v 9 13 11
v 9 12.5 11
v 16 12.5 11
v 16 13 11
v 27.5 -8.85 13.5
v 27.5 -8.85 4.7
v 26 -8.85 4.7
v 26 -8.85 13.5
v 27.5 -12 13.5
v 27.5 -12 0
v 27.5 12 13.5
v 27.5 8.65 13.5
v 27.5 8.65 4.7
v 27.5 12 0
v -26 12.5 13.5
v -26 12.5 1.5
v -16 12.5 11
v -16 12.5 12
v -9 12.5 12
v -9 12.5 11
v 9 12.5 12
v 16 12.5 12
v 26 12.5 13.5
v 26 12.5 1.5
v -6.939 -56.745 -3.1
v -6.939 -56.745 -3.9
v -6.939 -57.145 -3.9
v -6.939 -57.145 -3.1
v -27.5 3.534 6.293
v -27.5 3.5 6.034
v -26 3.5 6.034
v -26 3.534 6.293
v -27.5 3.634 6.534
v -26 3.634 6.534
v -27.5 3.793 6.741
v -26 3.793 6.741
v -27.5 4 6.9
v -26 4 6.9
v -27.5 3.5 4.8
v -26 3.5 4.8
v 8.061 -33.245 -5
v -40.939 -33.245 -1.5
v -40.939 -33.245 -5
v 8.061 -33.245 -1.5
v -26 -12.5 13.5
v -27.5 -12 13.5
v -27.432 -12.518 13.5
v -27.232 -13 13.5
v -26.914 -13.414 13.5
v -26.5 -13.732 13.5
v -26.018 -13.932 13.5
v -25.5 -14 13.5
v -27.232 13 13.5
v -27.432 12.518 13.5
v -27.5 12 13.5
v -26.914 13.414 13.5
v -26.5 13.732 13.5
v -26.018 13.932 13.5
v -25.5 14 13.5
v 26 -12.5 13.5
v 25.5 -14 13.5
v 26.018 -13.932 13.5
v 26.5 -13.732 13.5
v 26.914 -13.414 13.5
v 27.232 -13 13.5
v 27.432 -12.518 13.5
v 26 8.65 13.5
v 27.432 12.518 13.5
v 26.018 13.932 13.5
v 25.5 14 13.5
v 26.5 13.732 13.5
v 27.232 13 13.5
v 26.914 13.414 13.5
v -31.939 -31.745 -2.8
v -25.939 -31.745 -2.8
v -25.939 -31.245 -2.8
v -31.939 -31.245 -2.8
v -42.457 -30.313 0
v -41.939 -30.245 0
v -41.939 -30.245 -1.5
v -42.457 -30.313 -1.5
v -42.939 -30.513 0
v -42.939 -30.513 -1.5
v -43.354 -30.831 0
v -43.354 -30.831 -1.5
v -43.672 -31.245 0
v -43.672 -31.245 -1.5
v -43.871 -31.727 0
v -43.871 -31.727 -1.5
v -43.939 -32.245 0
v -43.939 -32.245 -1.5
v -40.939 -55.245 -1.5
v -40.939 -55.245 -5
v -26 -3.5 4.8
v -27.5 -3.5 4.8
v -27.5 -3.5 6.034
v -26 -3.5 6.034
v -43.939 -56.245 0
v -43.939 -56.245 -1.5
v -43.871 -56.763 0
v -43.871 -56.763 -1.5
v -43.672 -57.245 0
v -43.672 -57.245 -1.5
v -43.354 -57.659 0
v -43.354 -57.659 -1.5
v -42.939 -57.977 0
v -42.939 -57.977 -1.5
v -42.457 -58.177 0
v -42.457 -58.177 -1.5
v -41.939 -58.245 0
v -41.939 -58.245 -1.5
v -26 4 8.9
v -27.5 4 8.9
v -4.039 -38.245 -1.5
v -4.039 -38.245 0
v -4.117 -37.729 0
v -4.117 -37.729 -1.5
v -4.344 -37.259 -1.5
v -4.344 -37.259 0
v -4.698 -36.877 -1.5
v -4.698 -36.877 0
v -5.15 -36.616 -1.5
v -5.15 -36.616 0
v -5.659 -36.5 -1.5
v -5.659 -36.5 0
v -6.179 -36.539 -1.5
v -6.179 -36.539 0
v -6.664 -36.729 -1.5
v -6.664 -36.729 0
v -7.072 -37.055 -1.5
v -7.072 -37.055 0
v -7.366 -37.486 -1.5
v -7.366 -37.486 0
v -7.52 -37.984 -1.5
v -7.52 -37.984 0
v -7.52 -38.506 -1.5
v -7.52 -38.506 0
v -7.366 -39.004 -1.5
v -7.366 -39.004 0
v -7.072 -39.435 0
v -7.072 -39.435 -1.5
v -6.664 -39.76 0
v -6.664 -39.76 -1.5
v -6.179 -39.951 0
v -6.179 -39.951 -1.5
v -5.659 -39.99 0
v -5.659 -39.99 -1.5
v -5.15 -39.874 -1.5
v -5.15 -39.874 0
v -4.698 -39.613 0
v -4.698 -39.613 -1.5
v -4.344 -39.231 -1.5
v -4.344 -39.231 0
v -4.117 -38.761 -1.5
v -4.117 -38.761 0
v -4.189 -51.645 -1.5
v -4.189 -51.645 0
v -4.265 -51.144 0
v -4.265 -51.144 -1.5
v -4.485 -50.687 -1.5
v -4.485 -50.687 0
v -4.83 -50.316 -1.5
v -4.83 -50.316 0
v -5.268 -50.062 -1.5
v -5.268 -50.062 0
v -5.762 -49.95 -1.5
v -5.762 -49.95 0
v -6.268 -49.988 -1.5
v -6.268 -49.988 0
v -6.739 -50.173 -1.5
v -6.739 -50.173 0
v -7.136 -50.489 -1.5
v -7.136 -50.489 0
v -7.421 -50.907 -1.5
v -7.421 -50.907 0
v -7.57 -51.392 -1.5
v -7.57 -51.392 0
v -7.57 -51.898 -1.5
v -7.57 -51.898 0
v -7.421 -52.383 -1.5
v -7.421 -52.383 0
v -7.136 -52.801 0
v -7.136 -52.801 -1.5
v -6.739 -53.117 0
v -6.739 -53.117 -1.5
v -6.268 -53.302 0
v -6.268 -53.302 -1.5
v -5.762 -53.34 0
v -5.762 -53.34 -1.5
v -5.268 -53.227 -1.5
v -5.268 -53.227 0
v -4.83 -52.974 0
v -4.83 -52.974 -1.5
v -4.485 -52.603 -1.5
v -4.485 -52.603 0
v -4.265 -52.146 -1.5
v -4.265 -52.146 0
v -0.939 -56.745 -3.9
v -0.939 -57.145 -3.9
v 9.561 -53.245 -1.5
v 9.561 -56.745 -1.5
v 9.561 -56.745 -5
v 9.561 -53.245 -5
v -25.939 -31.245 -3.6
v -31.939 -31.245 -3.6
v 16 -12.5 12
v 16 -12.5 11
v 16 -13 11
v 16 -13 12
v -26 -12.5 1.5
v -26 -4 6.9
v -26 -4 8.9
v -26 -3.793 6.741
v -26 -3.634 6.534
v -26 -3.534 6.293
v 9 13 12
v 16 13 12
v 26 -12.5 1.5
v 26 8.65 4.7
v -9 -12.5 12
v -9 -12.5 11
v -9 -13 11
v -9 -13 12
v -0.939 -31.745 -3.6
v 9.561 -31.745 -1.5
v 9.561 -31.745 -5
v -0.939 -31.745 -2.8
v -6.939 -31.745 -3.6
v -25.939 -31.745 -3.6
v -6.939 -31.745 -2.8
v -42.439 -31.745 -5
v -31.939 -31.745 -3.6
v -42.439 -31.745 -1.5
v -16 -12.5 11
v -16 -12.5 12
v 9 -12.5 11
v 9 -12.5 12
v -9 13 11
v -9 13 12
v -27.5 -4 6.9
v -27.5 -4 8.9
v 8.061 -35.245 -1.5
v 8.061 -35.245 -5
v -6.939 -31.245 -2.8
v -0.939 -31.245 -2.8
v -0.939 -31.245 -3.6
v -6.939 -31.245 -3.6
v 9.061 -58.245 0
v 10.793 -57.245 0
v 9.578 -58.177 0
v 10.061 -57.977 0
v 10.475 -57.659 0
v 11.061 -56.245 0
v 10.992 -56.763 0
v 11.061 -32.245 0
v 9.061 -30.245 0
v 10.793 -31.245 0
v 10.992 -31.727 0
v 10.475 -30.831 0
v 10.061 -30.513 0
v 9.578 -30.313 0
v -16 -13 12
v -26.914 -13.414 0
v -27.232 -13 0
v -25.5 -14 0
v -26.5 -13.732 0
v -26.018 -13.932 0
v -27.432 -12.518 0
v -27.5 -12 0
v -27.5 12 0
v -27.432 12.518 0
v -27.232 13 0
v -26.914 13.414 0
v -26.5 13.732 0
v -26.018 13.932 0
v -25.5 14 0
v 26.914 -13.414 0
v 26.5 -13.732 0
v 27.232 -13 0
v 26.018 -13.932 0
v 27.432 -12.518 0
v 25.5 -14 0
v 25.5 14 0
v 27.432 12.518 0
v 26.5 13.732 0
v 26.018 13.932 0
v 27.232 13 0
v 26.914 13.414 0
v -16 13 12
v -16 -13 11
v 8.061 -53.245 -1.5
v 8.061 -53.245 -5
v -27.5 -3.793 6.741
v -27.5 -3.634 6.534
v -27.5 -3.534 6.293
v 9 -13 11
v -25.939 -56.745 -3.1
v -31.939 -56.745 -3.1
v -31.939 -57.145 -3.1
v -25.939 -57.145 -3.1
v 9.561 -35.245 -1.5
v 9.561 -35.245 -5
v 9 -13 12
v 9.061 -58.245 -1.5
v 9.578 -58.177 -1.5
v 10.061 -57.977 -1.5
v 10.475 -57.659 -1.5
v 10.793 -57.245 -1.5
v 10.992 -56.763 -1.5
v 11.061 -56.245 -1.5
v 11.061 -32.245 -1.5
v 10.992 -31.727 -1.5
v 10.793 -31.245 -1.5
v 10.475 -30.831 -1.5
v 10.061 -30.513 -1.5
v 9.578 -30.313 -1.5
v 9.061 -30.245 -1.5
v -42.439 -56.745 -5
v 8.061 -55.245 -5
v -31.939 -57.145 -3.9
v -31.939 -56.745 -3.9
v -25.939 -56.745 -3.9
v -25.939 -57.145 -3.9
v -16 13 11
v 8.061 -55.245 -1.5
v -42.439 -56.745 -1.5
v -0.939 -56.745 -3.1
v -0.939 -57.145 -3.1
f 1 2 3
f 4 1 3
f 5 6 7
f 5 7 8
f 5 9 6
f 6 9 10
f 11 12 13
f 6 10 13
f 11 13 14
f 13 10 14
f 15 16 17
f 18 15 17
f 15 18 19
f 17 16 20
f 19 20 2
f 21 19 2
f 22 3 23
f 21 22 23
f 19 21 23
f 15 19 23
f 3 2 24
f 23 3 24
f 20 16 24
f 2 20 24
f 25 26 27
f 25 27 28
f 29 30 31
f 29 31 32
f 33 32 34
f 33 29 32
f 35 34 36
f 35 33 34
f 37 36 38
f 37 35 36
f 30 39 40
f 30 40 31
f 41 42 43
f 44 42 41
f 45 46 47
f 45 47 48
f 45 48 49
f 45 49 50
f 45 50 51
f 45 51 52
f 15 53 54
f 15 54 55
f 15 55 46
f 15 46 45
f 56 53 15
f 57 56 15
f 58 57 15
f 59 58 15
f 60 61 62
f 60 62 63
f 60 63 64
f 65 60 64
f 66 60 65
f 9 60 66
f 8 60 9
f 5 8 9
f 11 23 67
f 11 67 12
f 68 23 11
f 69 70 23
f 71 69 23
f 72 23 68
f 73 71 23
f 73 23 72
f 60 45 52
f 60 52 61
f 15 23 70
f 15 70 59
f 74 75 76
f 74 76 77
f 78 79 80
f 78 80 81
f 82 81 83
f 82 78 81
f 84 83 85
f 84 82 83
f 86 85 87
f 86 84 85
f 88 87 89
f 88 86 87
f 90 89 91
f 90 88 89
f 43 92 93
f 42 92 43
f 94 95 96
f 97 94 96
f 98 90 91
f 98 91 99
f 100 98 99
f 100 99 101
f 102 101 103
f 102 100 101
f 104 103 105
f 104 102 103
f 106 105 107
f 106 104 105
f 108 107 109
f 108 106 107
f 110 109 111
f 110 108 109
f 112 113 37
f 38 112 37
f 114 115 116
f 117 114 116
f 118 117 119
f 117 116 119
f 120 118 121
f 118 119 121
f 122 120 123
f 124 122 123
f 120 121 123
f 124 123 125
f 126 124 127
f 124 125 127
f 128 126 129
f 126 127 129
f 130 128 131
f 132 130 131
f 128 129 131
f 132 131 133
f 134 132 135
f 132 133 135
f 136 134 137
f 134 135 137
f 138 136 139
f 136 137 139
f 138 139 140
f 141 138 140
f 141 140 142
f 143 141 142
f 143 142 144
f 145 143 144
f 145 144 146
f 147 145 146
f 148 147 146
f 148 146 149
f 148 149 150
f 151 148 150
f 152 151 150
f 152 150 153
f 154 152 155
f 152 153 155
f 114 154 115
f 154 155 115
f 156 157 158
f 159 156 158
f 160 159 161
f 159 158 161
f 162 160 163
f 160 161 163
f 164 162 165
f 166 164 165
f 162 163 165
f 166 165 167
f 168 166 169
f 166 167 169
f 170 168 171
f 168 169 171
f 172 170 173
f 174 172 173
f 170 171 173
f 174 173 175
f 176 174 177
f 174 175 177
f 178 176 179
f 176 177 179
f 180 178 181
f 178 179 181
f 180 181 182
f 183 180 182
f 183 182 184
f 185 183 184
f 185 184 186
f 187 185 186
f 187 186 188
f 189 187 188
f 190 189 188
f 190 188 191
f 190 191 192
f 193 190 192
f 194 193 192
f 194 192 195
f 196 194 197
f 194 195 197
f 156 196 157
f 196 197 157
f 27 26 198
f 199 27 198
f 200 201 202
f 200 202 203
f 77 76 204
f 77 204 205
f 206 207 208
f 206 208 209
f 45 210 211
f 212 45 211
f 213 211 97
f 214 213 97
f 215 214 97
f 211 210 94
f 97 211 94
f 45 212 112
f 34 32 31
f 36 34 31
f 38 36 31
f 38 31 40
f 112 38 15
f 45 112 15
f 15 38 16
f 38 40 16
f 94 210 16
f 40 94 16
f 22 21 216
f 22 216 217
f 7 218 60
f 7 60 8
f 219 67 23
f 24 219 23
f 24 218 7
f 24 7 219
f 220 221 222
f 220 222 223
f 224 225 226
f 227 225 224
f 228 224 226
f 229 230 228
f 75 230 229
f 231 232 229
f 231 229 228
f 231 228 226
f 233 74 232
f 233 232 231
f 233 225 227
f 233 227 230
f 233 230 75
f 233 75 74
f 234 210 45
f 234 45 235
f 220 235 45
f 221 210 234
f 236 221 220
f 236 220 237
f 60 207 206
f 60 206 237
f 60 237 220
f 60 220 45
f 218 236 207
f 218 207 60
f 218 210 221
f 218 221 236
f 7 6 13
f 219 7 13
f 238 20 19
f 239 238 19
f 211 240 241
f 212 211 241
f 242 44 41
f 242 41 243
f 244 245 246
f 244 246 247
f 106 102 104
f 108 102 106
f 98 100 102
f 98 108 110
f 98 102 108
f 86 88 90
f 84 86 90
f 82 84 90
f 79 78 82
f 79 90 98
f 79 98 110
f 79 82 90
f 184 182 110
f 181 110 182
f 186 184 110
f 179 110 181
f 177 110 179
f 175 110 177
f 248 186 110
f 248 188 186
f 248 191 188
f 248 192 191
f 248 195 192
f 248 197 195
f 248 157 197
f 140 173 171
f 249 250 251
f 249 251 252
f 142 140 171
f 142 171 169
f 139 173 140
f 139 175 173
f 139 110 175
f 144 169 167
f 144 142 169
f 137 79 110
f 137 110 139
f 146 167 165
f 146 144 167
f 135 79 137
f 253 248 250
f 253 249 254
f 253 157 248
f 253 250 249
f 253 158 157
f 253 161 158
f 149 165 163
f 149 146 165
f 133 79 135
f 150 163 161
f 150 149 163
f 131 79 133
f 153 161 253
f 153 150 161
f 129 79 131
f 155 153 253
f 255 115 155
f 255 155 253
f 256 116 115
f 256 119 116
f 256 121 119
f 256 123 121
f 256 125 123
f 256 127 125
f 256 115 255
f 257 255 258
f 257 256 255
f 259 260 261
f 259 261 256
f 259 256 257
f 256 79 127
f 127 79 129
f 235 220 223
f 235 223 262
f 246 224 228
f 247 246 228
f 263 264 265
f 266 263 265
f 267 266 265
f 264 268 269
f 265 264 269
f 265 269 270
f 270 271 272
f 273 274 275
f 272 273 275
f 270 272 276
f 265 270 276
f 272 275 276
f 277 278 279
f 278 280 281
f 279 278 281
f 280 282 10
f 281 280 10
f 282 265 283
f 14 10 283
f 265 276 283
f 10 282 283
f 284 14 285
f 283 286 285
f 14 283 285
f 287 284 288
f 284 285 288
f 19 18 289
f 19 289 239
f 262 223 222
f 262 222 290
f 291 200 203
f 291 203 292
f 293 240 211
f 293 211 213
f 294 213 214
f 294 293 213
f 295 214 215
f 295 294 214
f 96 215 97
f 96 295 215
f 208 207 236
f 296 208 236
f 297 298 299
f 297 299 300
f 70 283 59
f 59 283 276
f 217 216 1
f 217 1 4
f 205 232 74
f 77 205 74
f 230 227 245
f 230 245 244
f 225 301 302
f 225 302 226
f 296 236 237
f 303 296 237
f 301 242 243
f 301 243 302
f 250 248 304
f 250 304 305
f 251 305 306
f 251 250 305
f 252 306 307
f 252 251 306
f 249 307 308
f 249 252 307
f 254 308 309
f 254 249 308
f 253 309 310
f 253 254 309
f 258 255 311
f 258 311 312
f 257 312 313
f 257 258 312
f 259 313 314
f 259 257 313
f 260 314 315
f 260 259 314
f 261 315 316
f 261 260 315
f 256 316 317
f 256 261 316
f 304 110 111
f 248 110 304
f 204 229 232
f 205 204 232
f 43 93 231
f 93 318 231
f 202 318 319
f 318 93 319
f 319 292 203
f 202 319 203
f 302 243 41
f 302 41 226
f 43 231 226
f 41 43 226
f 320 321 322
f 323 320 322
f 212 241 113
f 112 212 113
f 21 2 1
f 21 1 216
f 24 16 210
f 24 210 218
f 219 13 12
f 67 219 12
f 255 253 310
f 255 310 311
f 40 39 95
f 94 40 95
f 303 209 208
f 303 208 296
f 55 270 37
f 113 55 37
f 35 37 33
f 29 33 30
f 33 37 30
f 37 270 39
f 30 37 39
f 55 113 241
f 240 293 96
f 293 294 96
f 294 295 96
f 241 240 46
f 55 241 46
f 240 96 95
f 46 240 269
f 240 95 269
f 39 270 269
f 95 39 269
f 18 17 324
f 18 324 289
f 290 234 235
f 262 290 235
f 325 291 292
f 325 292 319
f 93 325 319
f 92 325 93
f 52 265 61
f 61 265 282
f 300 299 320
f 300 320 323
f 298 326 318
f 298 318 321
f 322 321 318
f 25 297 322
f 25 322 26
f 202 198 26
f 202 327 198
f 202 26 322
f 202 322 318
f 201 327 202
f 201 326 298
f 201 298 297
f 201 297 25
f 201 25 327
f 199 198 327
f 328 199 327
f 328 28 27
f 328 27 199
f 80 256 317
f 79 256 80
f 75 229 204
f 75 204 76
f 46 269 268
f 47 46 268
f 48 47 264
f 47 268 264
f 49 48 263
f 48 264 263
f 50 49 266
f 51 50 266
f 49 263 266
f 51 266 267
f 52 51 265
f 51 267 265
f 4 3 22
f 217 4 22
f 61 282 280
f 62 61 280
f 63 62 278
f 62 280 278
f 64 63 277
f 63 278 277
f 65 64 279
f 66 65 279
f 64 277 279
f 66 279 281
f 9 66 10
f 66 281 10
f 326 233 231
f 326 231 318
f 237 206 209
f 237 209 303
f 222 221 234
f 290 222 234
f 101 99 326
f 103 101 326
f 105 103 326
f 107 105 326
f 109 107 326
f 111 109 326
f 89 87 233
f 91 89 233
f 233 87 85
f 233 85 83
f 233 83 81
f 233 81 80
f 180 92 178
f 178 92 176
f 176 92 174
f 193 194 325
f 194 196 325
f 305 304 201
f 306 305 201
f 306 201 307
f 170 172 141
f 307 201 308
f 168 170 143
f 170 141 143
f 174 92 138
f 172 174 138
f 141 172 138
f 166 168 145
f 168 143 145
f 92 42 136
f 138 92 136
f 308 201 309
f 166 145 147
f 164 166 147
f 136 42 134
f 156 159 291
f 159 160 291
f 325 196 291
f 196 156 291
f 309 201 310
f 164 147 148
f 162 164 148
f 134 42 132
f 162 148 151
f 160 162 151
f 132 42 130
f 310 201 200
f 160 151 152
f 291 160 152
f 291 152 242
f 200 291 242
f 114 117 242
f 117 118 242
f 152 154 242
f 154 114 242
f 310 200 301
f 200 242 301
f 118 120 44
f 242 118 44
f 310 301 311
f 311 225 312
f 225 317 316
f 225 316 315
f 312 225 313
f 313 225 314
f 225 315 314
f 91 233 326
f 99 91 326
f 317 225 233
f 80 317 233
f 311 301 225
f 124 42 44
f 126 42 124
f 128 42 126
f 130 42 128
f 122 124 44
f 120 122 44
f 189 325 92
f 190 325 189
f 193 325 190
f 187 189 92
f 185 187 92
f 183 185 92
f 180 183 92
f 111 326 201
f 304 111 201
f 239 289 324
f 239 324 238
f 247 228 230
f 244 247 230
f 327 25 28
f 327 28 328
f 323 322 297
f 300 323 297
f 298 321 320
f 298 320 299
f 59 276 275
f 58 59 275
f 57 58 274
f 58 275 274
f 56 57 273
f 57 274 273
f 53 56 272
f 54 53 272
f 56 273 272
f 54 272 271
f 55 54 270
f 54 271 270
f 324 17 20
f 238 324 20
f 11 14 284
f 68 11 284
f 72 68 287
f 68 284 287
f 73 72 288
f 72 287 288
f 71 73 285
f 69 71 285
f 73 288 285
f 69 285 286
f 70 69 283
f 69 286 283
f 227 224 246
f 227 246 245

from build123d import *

# Parameters (mm, degrees)
F0_W        = 52
F0_H        = 25
F0_R        = 1.75
F1_DEPTH    = 1.5
F2_DEPTH    = 13.5
F3_W        = 17.5
F3_H        = 8.8
F4_DEPTH    = 25
F5_W        = 7
F5_H        = 2.1
F6_DEPTH    = 2
F7_T1_DEPTH = 5.8301270189
F9_W        = 7
F9_H        = 1
F10_DEPTH   = 0.5
F11_W       = 7
F11_H       = 1
F12_DEPTH   = 0.5
F0_R_2      = 1.7
F0_W_2      = 1.5
F0_H_2      = 18
F13_DEPTH   = 1.5
F14_DEPTH   = 5
F15_W       = 6
F15_H       = 0.8
F16_DEPTH   = 0.4
F17_W       = 6
F17_H       = 0.8
F18_DEPTH   = 0.5


# Not quite as in the source:
# - a fillet or chamfer that OpenCascade refuses, or shapes differently, is made with other operations: its cross-section is extruded or revolved along the edge and cut away or added


with BuildPart() as f1:
    # F0 (on Top) → F1 (new body)
    with BuildSketch(Plane.XY):
        Rectangle(F0_W, F0_H)
        with Locations((-21.9428632408, 0)):
            Circle(F0_R, mode=Mode.SUBTRACT)
        with Locations((-21.9428632408, 0)):
            Circle(F0_R)
    extrude(amount=F1_DEPTH)

    # F0 (on Top) → F2 (join)
    with BuildSketch(Plane.XY):
        with BuildLine():
            Line((25.5, 14), (-25.5, 14))
            ThreePointArc((-25.5, 14), (-26.9142135624, 13.4142135624), (-27.5, 12))
            Line((-27.5, 12), (-27.5, -12))
            ThreePointArc((-27.5, -12), (-26.9142135624, -13.4142135624), (-25.5, -14))
            Line((-25.5, -14), (25.5, -14))
            ThreePointArc((25.5, -14), (26.9142135624, -13.4142135624), (27.5, -12))
            Line((27.5, -12), (27.5, 12))
            ThreePointArc((27.5, 12), (26.9142135624, 13.4142135624), (25.5, 14))
        make_face()
        Rectangle(F0_W, F0_H, mode=Mode.SUBTRACT)
    extrude(amount=F2_DEPTH)

    # F3 (on face) → F4 (cut)
    with BuildSketch(Plane.YZ.offset(27.5)):
        with Locations((-0.1, 9.1)):
            Rectangle(F3_W, F3_H)
    extrude(amount=-F4_DEPTH, mode=Mode.SUBTRACT)

    # F5 (on face) → F6 (cut)
    with BuildSketch(Plane(origin=(-27.5, 0, 0), x_dir=(0, -1, 0), z_dir=(-1, 0, 0))):
        with Locations((0, 5.85)):
            Rectangle(F5_W, F5_H)
        Polygon((-3.5, 6.9), (3.5, 6.9), (4, 6.9), (4, 8.9), (-4, 8.9), (-4, 6.9), align=None)
    extrude(amount=-F6_DEPTH, mode=Mode.SUBTRACT)

    # F7: fillet of radius 1 on 2 edges, made by hand

    # F7_s2 → F7_t1 (cut)
    with BuildSketch(Plane.YZ.offset(-29.6650635095)):
        with BuildLine():
            ThreePointArc((3.5, 6.0339745962), (3.6339745962, 6.5339745962), (4, 6.9))
            Line((4, 6.9), (3.5, 6.9))
            Line((3.5, 6.9), (3.5, 6.0339745962))
        make_face()
        with BuildLine():
            ThreePointArc((-4, 6.9), (-3.6339745962, 6.5339745962), (-3.5, 6.0339745962))
            Line((-3.5, 6.0339745962), (-3.5, 6.9))
            Line((-3.5, 6.9), (-4, 6.9))
        make_face()
    extrude(amount=F7_T1_DEPTH, mode=Mode.SUBTRACT)

    # F9 (on face) → F10 (cut)
    with BuildSketch(Plane.XZ.offset(-12.5)):
        with Locations((-12.5, 11.5)):
            Rectangle(F9_W, F9_H)
        with Locations((12.5, 11.5)):
            Rectangle(F9_W, F9_H)
    extrude(amount=-F10_DEPTH, mode=Mode.SUBTRACT)

    # F11 (on face) → F12 (cut)
    with BuildSketch(Plane(origin=(0, -12.5, 0), x_dir=(-1, 0, 0), z_dir=(0, 1, 0))):
        with Locations((-12.5, 11.5)):
            Rectangle(F11_W, F11_H)
        with Locations((12.5, 11.5)):
            Rectangle(F11_W, F11_H)
    extrude(amount=-F12_DEPTH, mode=Mode.SUBTRACT)


with BuildPart() as f13:
    # F0 (on Top) → F13 (new body)
    with BuildSketch(Plane.XY):
        with BuildLine():
            Line((-42.439452043, -56.7449450493), (-42.439452043, -31.7449450493))
            Line((-42.439452043, -31.7449450493), (9.560547957, -31.7449450493))
            Line((9.560547957, -31.7449450493), (9.560547957, -35.2449450493))
            Line((9.560547957, -35.2449450493), (11.060547957, -35.2449450493))
            Line((11.060547957, -35.2449450493), (11.060547957, -32.2449450493))
            ThreePointArc((11.060547957, -32.2449450493), (10.4747615194, -30.8307314869), (9.060547957, -30.2449450493))
            Line((9.060547957, -30.2449450493), (-41.939452043, -30.2449450493))
            ThreePointArc((-41.939452043, -30.2449450493), (-43.3536656054, -30.8307314869), (-43.939452043, -32.2449450493))
            Line((-43.939452043, -32.2449450493), (-43.939452043, -56.2449450493))
            ThreePointArc((-43.939452043, -56.2449450493), (-43.3536656054, -57.6591586117), (-41.939452043, -58.2449450493))
            Line((-41.939452043, -58.2449450493), (9.060547957, -58.2449450493))
            ThreePointArc((9.060547957, -58.2449450493), (10.4747615194, -57.6591586117), (11.060547957, -56.2449450493))
            Line((11.060547957, -56.2449450493), (11.060547957, -53.2449450493))
            Line((11.060547957, -53.2449450493), (9.560547957, -53.2449450493))
            Line((9.560547957, -53.2449450493), (9.560547957, -56.7449450493))
            Line((9.560547957, -56.7449450493), (-42.439452043, -56.7449450493))
        make_face()
        Polygon((8.060547957, -53.2449450493), (8.060547957, -35.2449450493), (8.060547957, -33.2449450493), (-40.939452043, -33.2449450493), (-40.939452043, -55.2449450493), (8.060547957, -55.2449450493), align=None)
        with Locations((-38.3823152838, -44.2449450493)):
            Circle(F0_R, mode=Mode.SUBTRACT)
        with Locations((-5.889452043, -51.6449450493)):
            Circle(F0_R_2, mode=Mode.SUBTRACT)
        with Locations((-5.789452043, -38.2449450493)):
            Circle(F0_R, mode=Mode.SUBTRACT)
        with Locations((-38.3823152838, -44.2449450493)):
            Circle(F0_R)
        with Locations((8.810547957, -44.2449450493)):
            Rectangle(F0_W_2, F0_H_2)
        with Locations((10.310547957, -44.2449450493)):
            Rectangle(F0_W_2, F0_H_2)
    extrude(amount=-F13_DEPTH)

    # F0 (on Top) → F14 (join)
    with BuildSketch(Plane.XY):
        Polygon((9.560547957, -31.7449450493), (-42.439452043, -31.7449450493), (-42.439452043, -56.7449450493), (9.560547957, -56.7449450493), (9.560547957, -53.2449450493), (8.060547957, -53.2449450493), (8.060547957, -55.2449450493), (-40.939452043, -55.2449450493), (-40.939452043, -33.2449450493), (8.060547957, -33.2449450493), (8.060547957, -35.2449450493), (9.560547957, -35.2449450493), align=None)
    extrude(amount=-F14_DEPTH)

    # F15 (on face) → F16 (join)
    with BuildSketch(Plane.XZ.offset(56.7449450493)):
        with Locations((-28.939452043, -3.5)):
            Rectangle(F15_W, F15_H)
        with Locations((-3.939452043, -3.5)):
            Rectangle(F15_W, F15_H)
    extrude(amount=F16_DEPTH)

    # F17 (on face) → F18 (join)
    with BuildSketch(Plane(origin=(0, -31.7449450493, 0), x_dir=(-1, 0, 0), z_dir=(0, 1, 0))):
        with Locations((28.939452043, -3.2)):
            Rectangle(F17_W, F17_H)
        with Locations((3.939452043, -3.2)):
            Rectangle(F17_W, F17_H)
    extrude(amount=F18_DEPTH)


solid = Compound([f1.part, f13.part])
